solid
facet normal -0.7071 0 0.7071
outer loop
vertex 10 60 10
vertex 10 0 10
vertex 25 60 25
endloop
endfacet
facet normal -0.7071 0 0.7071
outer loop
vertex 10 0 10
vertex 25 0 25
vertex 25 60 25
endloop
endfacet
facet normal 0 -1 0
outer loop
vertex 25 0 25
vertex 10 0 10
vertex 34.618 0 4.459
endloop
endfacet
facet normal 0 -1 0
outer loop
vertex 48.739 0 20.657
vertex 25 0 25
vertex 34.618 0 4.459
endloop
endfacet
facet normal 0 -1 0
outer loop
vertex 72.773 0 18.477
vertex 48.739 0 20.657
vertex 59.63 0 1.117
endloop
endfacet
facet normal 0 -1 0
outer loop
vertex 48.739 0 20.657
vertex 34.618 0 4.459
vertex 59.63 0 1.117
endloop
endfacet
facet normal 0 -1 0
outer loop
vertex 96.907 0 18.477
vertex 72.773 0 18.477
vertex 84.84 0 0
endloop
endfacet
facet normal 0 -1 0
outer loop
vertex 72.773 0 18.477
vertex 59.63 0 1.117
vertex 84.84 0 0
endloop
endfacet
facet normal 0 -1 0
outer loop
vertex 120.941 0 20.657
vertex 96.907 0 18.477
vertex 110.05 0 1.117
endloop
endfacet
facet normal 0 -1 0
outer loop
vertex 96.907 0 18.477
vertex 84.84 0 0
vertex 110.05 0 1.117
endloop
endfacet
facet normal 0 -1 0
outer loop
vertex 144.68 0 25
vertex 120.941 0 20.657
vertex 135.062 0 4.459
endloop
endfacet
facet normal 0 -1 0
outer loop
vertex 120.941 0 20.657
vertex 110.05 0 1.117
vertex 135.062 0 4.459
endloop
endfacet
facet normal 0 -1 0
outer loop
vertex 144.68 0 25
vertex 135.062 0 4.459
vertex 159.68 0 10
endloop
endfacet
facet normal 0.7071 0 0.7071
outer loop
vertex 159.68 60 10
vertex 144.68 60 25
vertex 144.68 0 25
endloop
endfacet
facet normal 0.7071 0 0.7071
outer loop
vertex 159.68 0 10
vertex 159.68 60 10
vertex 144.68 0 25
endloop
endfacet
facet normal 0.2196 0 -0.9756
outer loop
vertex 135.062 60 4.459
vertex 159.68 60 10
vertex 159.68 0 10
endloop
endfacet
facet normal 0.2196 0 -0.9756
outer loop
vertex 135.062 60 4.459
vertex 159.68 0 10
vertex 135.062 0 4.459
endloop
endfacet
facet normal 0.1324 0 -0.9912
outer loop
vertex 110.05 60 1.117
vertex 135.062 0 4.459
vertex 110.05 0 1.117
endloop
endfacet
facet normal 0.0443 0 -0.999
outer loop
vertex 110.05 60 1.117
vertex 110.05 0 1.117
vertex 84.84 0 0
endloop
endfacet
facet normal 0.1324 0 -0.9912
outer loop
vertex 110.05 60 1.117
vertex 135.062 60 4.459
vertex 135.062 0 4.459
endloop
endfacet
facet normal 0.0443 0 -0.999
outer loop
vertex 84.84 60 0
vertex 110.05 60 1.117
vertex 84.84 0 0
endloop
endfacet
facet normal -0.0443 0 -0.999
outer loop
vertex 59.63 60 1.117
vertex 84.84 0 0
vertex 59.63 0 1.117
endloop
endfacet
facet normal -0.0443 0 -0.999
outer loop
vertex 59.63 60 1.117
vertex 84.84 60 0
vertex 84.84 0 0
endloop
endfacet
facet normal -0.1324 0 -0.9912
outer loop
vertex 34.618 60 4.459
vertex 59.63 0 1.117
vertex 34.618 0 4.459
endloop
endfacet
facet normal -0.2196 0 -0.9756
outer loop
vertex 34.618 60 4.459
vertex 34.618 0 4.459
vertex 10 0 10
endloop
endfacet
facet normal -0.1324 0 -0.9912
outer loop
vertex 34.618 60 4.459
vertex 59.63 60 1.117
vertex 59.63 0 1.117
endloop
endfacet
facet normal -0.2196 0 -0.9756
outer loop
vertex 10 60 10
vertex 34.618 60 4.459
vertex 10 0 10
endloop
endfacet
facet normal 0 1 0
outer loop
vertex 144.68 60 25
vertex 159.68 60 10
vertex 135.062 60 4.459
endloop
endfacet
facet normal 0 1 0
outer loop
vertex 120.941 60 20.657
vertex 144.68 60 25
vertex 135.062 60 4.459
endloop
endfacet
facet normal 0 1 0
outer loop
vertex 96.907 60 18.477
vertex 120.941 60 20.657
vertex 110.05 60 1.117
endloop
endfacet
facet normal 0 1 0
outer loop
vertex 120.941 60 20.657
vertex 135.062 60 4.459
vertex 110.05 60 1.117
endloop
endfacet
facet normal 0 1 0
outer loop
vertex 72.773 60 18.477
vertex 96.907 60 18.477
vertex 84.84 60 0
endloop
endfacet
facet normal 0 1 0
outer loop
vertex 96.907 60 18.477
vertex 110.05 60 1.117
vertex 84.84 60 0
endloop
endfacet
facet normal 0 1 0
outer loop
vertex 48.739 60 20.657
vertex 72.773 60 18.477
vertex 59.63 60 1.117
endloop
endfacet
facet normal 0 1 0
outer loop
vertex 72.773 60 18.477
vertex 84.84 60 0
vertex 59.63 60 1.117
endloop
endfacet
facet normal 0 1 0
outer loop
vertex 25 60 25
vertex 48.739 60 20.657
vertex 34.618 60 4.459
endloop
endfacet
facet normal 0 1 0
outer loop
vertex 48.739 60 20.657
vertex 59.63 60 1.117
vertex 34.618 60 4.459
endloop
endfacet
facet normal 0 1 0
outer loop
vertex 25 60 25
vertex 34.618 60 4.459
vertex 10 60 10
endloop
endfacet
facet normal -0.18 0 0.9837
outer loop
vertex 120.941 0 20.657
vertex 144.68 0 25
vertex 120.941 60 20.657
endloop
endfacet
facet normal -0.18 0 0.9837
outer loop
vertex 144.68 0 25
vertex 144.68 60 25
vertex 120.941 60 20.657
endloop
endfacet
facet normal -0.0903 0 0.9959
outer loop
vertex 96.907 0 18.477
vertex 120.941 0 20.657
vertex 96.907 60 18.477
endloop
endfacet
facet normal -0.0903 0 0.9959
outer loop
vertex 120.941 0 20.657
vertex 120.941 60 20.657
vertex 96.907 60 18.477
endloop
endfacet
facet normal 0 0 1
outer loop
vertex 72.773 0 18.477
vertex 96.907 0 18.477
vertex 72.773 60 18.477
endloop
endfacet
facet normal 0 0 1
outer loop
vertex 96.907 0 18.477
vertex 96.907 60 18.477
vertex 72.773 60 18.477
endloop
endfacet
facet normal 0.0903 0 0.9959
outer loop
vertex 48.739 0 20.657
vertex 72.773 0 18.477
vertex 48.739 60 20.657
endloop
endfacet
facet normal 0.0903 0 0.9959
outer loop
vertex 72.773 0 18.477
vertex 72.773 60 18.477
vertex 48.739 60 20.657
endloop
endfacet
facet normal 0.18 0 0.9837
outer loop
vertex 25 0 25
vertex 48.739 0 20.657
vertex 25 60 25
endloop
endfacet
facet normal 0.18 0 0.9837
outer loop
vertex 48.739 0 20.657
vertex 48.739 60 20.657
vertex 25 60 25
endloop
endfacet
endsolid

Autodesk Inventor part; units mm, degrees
ref_plane "YZ Plane" through (0, 0, 0) normal (1, 0, 0) x (0, 1, 0)
ref_plane "XZ Plane" through (0, 0, 0) normal (0, 1, 0) x (-1, 0, 0)
ref_plane "XY Plane" through (0, 0, 0) normal (0, 0, 1) x (1, 0, 0)
sketch "Эскиз1" plane through (0, 0, 0) normal (0, 0, 1) x (1, 0, 0)
  line L0 (0, 0) -> (169.68, 0)
  line L1 (169.68, 0) -> (169.68, 60)
  line L2 (169.68, 60) -> (0, 60)
  line L3 (0, 60) -> (0, 0)
  dimension "d0" = 169.68
  dimension "d1" = 60
extrude "Выдавливание1" add sketch "Эскиз1" along normal blind 25
chamfer "Фаска1" distance 25 angle 45 2 edges at (0, 30, 25) (169.68, 30, 25)
sketch "Эскиз2" plane through (0, 60, 0) normal (0, 1, 0) x (1, 0, 0)
  line L0 (0, 0) -> (169.68, 0) projected
  line L1 (84.84, 0) -> (84.84, -96.7295)
  line L2 (169.68, 0) -> (0, 0) projected
  line L3 (25, -25) -> (144.68, -25) projected
  line L4 (0, 0) -> (25, -25) projected
  arc A0 (144.68, -25) -> (25, -25) centre (84.84, -285.0513) ccw
  line L5 (144.68, -25) -> (169.68, 0) projected
  arc A1 (159.68, -10) -> (10, -10) centre (84.84, -285.0513) ccw
  point P0 (169.68, -12)
  point P1 (0, -25)
  point P2 (169.68, -25)
  dimension "d7" = 10
extrude "Выдавливание2" cut sketch "Эскиз2" against normal blind 60 contours L0 A1 L4 | L0 L5 A1 | A0 L3 L1 | L1 L3 A0
properties part number "Long" material "Красное дерево"
